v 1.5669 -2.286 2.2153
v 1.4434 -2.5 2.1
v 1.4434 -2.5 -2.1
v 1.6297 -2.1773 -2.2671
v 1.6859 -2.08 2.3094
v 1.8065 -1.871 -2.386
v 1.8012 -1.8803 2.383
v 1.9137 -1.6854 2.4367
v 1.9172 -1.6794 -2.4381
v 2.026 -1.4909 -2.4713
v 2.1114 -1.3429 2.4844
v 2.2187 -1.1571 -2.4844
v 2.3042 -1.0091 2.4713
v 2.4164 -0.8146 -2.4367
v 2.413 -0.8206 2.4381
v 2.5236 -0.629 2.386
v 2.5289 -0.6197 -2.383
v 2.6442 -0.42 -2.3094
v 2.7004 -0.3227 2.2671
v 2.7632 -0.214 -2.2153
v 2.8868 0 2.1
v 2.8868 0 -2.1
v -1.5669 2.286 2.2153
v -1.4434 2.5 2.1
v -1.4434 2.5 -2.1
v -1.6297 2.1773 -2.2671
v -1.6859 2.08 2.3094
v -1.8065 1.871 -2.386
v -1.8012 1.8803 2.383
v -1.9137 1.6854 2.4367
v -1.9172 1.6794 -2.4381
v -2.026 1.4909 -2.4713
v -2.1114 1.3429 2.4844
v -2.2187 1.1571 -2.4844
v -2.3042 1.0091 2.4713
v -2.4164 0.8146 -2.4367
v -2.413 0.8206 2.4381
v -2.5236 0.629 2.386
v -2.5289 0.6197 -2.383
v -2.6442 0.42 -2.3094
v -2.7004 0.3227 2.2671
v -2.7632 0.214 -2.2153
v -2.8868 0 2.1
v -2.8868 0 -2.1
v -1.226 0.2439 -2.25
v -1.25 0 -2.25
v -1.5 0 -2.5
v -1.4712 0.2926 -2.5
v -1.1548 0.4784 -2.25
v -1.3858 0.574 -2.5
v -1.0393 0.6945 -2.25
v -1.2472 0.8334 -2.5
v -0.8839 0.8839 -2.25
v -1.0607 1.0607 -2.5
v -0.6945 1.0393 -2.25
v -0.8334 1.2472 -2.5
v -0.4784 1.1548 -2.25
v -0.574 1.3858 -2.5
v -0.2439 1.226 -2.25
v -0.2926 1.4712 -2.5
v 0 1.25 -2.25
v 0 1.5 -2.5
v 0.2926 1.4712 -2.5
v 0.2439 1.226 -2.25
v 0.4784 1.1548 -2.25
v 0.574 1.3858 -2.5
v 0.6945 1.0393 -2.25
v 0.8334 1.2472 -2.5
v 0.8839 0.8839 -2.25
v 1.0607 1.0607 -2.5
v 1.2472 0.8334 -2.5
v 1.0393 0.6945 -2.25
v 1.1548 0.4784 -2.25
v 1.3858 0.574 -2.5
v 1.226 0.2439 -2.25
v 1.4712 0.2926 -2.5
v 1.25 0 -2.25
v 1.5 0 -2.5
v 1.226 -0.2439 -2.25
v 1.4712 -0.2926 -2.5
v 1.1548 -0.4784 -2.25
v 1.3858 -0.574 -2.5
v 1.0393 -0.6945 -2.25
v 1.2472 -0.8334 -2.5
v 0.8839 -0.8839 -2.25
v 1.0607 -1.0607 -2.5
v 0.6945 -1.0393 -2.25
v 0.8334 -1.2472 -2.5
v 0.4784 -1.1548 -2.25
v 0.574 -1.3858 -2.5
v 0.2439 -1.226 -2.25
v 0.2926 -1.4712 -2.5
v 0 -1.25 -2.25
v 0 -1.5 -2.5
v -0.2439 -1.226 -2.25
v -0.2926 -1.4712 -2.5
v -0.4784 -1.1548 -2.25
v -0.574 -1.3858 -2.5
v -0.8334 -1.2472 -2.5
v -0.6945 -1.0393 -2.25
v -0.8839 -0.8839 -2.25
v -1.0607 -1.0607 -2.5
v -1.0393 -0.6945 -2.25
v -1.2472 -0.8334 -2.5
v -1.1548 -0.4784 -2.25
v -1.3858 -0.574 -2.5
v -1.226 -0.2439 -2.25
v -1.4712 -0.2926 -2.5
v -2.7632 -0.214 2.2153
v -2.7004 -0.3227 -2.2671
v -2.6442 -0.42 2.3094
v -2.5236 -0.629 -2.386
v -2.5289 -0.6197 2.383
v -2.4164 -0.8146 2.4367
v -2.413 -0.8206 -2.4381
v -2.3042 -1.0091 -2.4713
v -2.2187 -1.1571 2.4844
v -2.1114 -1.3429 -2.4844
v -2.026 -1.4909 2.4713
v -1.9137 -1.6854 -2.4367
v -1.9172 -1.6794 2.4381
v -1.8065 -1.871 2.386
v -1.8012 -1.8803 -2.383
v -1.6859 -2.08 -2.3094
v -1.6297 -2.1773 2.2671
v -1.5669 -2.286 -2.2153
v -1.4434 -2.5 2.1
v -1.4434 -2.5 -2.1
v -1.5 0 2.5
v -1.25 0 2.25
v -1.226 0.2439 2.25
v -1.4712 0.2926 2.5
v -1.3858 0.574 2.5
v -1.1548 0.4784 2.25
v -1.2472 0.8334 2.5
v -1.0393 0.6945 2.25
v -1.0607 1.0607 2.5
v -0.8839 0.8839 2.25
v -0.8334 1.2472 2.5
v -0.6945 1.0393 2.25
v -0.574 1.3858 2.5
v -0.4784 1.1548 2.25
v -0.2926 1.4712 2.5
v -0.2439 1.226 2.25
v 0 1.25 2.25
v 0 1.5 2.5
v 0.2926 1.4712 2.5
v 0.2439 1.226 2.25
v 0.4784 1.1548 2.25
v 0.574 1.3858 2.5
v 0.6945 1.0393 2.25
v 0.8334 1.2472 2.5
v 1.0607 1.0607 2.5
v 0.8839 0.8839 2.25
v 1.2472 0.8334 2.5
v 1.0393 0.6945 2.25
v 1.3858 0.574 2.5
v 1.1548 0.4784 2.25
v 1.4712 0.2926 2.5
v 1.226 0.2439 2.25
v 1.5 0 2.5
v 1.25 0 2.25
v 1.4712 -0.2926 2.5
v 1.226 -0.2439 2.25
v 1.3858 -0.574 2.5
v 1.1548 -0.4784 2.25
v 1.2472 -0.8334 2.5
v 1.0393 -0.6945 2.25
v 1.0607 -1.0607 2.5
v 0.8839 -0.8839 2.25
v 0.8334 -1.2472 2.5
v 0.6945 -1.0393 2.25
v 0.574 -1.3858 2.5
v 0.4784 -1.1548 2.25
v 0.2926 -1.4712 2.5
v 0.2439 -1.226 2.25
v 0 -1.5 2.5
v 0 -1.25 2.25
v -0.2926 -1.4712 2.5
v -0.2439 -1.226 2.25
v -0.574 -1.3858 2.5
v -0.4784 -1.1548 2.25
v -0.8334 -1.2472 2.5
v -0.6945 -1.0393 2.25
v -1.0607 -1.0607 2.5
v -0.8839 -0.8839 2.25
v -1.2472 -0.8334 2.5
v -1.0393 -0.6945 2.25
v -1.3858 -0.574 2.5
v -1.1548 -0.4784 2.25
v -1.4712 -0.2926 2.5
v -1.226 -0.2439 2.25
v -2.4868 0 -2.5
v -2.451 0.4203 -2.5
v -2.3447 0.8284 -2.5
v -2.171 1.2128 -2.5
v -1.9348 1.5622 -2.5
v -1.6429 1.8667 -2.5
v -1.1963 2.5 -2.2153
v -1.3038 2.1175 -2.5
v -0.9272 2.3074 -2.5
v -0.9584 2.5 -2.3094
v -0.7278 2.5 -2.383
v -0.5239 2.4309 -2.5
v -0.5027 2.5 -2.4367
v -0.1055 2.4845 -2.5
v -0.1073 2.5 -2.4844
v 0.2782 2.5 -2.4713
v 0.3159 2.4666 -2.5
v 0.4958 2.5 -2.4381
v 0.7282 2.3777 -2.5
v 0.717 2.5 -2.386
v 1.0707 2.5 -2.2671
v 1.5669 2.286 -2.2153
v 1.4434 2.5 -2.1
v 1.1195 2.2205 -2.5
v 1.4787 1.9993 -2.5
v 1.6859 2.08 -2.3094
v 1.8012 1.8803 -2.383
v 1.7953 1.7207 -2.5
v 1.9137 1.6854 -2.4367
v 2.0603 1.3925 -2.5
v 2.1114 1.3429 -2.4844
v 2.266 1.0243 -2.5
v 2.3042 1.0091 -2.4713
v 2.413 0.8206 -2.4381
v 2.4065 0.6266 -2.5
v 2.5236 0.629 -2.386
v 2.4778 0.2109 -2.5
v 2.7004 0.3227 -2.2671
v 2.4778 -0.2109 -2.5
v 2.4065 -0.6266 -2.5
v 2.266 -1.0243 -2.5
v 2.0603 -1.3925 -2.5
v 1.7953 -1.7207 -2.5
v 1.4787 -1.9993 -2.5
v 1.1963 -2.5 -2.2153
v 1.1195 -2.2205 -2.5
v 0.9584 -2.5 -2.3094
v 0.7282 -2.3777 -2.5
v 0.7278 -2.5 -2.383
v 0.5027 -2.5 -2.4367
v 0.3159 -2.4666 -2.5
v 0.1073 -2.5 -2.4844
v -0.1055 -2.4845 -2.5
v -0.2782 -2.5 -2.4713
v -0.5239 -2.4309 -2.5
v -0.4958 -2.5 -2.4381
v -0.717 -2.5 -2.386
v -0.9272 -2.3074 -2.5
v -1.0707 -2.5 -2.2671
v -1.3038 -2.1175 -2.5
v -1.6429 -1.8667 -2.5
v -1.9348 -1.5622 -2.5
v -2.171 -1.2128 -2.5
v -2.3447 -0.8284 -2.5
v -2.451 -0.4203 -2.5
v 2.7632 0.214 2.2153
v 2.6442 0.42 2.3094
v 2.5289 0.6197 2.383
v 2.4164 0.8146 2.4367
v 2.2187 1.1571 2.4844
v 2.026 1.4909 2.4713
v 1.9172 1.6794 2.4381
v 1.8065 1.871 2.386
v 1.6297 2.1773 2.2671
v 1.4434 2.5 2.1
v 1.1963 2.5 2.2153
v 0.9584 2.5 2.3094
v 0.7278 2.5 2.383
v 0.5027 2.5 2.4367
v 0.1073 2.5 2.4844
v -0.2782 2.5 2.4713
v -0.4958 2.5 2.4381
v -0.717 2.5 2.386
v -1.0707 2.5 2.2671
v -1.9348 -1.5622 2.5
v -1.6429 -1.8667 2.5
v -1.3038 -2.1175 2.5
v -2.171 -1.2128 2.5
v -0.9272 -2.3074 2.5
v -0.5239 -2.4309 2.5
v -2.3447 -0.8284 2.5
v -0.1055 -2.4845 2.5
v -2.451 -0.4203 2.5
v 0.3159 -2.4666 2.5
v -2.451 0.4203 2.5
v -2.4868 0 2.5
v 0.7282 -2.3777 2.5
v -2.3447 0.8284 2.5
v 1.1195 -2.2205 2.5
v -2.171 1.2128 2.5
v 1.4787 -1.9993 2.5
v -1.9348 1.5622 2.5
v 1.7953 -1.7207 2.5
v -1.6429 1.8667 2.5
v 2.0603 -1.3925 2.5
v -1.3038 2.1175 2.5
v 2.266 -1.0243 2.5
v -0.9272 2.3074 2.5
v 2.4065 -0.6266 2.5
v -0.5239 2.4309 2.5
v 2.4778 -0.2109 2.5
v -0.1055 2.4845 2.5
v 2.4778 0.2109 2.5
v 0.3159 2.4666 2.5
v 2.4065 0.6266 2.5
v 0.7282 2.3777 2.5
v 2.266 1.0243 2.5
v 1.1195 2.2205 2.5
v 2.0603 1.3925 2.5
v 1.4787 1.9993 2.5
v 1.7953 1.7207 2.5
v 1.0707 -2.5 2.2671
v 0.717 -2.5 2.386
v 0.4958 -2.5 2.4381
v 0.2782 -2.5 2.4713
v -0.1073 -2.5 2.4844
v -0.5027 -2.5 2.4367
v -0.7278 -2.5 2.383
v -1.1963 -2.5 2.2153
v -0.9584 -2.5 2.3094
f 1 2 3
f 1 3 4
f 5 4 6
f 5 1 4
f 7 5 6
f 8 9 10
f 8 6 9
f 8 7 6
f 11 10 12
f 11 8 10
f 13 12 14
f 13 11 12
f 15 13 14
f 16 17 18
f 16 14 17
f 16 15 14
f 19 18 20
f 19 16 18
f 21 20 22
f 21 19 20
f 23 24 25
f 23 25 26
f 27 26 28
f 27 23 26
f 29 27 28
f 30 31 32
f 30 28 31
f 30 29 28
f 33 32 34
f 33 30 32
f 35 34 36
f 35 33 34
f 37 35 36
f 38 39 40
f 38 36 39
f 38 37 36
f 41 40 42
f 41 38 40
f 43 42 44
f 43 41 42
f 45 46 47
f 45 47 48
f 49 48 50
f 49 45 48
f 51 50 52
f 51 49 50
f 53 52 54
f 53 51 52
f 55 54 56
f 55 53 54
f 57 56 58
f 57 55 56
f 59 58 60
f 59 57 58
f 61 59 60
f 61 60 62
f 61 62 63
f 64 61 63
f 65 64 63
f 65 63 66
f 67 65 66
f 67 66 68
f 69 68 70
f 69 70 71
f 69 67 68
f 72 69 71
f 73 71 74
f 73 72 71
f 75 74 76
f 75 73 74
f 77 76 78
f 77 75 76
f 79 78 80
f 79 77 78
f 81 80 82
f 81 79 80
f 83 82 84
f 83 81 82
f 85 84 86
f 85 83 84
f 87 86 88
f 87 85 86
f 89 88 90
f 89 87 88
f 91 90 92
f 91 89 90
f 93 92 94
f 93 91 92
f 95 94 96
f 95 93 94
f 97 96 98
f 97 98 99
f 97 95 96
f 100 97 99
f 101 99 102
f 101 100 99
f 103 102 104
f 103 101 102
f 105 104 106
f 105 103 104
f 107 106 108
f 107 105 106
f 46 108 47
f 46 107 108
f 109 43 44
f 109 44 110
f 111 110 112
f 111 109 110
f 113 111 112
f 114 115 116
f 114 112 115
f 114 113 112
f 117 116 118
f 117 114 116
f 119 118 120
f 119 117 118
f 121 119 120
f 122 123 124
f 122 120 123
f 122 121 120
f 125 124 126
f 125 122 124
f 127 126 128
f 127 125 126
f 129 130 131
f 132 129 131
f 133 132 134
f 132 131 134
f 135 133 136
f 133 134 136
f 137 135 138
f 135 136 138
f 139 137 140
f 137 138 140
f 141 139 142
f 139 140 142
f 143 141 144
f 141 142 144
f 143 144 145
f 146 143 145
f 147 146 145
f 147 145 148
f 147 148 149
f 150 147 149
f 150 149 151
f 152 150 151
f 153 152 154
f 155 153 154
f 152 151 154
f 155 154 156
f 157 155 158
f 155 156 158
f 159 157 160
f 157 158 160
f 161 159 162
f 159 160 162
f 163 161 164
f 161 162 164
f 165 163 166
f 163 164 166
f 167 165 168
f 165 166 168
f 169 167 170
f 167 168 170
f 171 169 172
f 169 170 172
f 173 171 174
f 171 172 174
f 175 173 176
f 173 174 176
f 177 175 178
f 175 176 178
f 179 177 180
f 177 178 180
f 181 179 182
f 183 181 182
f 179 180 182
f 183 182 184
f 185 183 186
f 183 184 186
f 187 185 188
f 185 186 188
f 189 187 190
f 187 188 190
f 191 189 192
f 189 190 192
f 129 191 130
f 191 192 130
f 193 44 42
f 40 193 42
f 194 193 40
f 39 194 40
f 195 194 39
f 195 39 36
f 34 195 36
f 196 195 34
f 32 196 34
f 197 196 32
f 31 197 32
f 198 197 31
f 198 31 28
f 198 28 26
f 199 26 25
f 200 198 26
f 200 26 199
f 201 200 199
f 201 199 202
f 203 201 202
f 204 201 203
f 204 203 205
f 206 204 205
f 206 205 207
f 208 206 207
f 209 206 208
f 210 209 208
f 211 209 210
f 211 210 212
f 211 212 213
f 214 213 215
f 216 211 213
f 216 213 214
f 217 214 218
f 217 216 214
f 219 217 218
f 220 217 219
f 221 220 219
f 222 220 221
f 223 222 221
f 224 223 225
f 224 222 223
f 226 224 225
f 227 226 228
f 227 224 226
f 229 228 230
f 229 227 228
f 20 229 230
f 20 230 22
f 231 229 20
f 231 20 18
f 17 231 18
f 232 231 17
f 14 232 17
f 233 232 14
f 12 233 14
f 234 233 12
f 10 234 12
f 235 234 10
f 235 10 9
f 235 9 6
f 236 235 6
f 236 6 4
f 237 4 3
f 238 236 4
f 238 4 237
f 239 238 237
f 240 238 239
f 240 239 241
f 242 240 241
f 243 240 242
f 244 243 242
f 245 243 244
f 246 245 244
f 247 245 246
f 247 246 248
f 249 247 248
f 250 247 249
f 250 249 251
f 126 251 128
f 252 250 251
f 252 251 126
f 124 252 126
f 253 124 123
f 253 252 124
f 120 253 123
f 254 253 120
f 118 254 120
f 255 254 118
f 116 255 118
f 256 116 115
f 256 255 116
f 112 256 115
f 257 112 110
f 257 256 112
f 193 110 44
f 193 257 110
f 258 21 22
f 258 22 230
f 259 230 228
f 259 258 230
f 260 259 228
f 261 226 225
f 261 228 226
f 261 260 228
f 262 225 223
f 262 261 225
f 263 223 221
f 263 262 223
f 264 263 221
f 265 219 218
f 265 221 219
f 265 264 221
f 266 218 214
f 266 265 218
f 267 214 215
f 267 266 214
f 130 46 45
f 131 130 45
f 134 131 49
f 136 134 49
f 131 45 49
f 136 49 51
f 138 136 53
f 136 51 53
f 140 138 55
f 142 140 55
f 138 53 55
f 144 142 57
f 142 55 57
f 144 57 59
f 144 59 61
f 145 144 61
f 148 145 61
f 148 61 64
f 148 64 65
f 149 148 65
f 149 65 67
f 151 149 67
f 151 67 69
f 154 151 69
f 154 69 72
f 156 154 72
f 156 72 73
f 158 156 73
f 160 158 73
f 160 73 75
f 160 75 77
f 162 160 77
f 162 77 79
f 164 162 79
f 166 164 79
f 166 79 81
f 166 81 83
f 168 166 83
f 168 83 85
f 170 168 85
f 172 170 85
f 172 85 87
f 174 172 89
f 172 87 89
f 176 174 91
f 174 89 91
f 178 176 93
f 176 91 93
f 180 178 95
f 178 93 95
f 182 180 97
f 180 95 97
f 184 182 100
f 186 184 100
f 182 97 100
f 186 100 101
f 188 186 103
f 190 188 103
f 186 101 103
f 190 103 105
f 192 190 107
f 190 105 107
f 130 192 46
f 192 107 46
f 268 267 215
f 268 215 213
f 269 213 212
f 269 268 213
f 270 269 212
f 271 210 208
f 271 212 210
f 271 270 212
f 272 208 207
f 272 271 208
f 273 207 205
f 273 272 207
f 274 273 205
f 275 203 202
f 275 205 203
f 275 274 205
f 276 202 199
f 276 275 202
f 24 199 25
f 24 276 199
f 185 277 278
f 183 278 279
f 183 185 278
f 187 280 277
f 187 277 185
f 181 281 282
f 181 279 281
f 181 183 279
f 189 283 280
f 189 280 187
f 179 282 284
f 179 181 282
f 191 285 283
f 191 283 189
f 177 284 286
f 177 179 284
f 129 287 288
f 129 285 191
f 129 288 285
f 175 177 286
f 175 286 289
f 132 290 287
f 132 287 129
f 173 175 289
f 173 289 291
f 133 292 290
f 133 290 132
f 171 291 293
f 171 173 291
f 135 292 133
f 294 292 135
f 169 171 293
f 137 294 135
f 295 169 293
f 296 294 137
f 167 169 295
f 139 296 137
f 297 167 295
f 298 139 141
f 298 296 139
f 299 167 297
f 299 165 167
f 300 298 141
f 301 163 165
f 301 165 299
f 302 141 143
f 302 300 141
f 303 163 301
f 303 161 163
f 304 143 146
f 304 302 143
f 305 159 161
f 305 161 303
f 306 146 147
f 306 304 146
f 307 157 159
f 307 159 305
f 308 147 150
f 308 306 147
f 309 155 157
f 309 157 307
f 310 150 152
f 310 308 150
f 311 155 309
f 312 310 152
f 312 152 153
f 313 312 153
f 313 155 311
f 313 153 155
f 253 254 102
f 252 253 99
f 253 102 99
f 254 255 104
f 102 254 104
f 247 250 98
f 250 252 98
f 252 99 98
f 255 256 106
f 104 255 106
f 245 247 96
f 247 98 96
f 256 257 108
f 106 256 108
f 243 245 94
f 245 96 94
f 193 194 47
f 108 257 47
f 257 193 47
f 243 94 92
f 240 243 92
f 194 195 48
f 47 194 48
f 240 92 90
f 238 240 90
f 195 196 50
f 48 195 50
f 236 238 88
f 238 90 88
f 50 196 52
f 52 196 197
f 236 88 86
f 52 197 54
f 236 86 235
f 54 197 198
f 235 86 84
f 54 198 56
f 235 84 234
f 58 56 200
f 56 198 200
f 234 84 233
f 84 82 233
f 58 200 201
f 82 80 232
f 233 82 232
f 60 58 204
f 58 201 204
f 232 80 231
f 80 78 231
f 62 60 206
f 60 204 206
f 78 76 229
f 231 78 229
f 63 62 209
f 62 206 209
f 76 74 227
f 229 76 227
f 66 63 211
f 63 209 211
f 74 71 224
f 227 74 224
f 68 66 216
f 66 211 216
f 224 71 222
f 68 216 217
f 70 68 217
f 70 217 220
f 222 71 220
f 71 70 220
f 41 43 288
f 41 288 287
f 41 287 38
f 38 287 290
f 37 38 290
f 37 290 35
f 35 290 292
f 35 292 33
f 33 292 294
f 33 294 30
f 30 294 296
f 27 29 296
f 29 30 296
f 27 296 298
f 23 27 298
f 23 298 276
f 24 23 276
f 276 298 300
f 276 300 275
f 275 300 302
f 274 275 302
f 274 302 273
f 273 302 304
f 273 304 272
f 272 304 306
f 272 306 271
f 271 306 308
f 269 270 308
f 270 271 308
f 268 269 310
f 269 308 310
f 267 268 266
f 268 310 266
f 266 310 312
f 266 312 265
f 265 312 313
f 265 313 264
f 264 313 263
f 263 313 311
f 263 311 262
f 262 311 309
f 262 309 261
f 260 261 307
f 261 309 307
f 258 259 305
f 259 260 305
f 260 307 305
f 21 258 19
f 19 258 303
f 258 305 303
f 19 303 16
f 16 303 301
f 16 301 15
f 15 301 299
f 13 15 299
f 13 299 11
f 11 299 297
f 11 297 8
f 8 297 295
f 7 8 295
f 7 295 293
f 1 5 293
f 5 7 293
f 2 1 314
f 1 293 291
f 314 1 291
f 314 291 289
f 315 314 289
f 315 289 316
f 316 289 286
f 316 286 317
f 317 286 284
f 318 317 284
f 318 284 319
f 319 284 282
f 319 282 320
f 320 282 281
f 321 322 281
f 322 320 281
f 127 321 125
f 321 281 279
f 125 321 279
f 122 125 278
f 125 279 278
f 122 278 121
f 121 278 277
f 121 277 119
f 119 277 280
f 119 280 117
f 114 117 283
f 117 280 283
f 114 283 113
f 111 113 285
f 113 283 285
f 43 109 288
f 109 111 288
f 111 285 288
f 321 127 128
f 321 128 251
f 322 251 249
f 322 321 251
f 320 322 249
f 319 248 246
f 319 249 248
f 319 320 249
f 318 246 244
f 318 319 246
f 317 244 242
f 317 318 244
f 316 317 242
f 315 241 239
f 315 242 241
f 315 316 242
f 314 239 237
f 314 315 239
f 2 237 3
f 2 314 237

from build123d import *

# Parameters (mm, degrees)
HEX_2_DEPTH                 = 2.5
TAP_DRILL_FOR_M3X0_5_TAP1_D = 2.5
INNERCHAMFER_SIZE           = 0.25


with BuildPart() as part:
    # Sketch1 → HEX 2 (new body, symmetric)
    with BuildSketch(Plane.XY):
        Polygon((2.886751346, 0), (1.443375673, 2.5), (-1.443375673, 2.5), (-2.886751346, 0), (-1.443375673, -2.5), (1.443375673, -2.5), align=None)
    extrude(amount=HEX_2_DEPTH, both=True)

    # Tap Drill for M3x0.5 Tap1 (through all)
    with Locations(Plane.XY.offset(2.5)):
        with Locations((0, 0)):
            Hole(TAP_DRILL_FOR_M3X0_5_TAP1_D / 2)

    # Sketch7 → HexChamfer (revolve, cut)
    with BuildSketch(Plane(origin=(0, 0, 0), x_dir=(1, 0, 0), z_dir=(0, 1, 0))):
        Polygon((-2.886751346, 2.5), (-2.886751346, 2.1), (-2.486751346, 2.5), align=None)
    hexchamfer = revolve(axis=Axis((0, 0, 15.266742202), (0, 0, -1)), mode=Mode.SUBTRACT)

    # Mirror1: HexChamfer across plane
    add(hexchamfer.mirror(Plane.XY), mode=Mode.SUBTRACT)

    # InnerChamfer
    innerchamfer_edges = [part.edges().sort_by_distance(p)[0] for p in [
        (1.25, 0, 2.5),
        (1.25, 0, -2.5),
    ]]
    chamfer(innerchamfer_edges, length=INNERCHAMFER_SIZE)


solid = part.part
